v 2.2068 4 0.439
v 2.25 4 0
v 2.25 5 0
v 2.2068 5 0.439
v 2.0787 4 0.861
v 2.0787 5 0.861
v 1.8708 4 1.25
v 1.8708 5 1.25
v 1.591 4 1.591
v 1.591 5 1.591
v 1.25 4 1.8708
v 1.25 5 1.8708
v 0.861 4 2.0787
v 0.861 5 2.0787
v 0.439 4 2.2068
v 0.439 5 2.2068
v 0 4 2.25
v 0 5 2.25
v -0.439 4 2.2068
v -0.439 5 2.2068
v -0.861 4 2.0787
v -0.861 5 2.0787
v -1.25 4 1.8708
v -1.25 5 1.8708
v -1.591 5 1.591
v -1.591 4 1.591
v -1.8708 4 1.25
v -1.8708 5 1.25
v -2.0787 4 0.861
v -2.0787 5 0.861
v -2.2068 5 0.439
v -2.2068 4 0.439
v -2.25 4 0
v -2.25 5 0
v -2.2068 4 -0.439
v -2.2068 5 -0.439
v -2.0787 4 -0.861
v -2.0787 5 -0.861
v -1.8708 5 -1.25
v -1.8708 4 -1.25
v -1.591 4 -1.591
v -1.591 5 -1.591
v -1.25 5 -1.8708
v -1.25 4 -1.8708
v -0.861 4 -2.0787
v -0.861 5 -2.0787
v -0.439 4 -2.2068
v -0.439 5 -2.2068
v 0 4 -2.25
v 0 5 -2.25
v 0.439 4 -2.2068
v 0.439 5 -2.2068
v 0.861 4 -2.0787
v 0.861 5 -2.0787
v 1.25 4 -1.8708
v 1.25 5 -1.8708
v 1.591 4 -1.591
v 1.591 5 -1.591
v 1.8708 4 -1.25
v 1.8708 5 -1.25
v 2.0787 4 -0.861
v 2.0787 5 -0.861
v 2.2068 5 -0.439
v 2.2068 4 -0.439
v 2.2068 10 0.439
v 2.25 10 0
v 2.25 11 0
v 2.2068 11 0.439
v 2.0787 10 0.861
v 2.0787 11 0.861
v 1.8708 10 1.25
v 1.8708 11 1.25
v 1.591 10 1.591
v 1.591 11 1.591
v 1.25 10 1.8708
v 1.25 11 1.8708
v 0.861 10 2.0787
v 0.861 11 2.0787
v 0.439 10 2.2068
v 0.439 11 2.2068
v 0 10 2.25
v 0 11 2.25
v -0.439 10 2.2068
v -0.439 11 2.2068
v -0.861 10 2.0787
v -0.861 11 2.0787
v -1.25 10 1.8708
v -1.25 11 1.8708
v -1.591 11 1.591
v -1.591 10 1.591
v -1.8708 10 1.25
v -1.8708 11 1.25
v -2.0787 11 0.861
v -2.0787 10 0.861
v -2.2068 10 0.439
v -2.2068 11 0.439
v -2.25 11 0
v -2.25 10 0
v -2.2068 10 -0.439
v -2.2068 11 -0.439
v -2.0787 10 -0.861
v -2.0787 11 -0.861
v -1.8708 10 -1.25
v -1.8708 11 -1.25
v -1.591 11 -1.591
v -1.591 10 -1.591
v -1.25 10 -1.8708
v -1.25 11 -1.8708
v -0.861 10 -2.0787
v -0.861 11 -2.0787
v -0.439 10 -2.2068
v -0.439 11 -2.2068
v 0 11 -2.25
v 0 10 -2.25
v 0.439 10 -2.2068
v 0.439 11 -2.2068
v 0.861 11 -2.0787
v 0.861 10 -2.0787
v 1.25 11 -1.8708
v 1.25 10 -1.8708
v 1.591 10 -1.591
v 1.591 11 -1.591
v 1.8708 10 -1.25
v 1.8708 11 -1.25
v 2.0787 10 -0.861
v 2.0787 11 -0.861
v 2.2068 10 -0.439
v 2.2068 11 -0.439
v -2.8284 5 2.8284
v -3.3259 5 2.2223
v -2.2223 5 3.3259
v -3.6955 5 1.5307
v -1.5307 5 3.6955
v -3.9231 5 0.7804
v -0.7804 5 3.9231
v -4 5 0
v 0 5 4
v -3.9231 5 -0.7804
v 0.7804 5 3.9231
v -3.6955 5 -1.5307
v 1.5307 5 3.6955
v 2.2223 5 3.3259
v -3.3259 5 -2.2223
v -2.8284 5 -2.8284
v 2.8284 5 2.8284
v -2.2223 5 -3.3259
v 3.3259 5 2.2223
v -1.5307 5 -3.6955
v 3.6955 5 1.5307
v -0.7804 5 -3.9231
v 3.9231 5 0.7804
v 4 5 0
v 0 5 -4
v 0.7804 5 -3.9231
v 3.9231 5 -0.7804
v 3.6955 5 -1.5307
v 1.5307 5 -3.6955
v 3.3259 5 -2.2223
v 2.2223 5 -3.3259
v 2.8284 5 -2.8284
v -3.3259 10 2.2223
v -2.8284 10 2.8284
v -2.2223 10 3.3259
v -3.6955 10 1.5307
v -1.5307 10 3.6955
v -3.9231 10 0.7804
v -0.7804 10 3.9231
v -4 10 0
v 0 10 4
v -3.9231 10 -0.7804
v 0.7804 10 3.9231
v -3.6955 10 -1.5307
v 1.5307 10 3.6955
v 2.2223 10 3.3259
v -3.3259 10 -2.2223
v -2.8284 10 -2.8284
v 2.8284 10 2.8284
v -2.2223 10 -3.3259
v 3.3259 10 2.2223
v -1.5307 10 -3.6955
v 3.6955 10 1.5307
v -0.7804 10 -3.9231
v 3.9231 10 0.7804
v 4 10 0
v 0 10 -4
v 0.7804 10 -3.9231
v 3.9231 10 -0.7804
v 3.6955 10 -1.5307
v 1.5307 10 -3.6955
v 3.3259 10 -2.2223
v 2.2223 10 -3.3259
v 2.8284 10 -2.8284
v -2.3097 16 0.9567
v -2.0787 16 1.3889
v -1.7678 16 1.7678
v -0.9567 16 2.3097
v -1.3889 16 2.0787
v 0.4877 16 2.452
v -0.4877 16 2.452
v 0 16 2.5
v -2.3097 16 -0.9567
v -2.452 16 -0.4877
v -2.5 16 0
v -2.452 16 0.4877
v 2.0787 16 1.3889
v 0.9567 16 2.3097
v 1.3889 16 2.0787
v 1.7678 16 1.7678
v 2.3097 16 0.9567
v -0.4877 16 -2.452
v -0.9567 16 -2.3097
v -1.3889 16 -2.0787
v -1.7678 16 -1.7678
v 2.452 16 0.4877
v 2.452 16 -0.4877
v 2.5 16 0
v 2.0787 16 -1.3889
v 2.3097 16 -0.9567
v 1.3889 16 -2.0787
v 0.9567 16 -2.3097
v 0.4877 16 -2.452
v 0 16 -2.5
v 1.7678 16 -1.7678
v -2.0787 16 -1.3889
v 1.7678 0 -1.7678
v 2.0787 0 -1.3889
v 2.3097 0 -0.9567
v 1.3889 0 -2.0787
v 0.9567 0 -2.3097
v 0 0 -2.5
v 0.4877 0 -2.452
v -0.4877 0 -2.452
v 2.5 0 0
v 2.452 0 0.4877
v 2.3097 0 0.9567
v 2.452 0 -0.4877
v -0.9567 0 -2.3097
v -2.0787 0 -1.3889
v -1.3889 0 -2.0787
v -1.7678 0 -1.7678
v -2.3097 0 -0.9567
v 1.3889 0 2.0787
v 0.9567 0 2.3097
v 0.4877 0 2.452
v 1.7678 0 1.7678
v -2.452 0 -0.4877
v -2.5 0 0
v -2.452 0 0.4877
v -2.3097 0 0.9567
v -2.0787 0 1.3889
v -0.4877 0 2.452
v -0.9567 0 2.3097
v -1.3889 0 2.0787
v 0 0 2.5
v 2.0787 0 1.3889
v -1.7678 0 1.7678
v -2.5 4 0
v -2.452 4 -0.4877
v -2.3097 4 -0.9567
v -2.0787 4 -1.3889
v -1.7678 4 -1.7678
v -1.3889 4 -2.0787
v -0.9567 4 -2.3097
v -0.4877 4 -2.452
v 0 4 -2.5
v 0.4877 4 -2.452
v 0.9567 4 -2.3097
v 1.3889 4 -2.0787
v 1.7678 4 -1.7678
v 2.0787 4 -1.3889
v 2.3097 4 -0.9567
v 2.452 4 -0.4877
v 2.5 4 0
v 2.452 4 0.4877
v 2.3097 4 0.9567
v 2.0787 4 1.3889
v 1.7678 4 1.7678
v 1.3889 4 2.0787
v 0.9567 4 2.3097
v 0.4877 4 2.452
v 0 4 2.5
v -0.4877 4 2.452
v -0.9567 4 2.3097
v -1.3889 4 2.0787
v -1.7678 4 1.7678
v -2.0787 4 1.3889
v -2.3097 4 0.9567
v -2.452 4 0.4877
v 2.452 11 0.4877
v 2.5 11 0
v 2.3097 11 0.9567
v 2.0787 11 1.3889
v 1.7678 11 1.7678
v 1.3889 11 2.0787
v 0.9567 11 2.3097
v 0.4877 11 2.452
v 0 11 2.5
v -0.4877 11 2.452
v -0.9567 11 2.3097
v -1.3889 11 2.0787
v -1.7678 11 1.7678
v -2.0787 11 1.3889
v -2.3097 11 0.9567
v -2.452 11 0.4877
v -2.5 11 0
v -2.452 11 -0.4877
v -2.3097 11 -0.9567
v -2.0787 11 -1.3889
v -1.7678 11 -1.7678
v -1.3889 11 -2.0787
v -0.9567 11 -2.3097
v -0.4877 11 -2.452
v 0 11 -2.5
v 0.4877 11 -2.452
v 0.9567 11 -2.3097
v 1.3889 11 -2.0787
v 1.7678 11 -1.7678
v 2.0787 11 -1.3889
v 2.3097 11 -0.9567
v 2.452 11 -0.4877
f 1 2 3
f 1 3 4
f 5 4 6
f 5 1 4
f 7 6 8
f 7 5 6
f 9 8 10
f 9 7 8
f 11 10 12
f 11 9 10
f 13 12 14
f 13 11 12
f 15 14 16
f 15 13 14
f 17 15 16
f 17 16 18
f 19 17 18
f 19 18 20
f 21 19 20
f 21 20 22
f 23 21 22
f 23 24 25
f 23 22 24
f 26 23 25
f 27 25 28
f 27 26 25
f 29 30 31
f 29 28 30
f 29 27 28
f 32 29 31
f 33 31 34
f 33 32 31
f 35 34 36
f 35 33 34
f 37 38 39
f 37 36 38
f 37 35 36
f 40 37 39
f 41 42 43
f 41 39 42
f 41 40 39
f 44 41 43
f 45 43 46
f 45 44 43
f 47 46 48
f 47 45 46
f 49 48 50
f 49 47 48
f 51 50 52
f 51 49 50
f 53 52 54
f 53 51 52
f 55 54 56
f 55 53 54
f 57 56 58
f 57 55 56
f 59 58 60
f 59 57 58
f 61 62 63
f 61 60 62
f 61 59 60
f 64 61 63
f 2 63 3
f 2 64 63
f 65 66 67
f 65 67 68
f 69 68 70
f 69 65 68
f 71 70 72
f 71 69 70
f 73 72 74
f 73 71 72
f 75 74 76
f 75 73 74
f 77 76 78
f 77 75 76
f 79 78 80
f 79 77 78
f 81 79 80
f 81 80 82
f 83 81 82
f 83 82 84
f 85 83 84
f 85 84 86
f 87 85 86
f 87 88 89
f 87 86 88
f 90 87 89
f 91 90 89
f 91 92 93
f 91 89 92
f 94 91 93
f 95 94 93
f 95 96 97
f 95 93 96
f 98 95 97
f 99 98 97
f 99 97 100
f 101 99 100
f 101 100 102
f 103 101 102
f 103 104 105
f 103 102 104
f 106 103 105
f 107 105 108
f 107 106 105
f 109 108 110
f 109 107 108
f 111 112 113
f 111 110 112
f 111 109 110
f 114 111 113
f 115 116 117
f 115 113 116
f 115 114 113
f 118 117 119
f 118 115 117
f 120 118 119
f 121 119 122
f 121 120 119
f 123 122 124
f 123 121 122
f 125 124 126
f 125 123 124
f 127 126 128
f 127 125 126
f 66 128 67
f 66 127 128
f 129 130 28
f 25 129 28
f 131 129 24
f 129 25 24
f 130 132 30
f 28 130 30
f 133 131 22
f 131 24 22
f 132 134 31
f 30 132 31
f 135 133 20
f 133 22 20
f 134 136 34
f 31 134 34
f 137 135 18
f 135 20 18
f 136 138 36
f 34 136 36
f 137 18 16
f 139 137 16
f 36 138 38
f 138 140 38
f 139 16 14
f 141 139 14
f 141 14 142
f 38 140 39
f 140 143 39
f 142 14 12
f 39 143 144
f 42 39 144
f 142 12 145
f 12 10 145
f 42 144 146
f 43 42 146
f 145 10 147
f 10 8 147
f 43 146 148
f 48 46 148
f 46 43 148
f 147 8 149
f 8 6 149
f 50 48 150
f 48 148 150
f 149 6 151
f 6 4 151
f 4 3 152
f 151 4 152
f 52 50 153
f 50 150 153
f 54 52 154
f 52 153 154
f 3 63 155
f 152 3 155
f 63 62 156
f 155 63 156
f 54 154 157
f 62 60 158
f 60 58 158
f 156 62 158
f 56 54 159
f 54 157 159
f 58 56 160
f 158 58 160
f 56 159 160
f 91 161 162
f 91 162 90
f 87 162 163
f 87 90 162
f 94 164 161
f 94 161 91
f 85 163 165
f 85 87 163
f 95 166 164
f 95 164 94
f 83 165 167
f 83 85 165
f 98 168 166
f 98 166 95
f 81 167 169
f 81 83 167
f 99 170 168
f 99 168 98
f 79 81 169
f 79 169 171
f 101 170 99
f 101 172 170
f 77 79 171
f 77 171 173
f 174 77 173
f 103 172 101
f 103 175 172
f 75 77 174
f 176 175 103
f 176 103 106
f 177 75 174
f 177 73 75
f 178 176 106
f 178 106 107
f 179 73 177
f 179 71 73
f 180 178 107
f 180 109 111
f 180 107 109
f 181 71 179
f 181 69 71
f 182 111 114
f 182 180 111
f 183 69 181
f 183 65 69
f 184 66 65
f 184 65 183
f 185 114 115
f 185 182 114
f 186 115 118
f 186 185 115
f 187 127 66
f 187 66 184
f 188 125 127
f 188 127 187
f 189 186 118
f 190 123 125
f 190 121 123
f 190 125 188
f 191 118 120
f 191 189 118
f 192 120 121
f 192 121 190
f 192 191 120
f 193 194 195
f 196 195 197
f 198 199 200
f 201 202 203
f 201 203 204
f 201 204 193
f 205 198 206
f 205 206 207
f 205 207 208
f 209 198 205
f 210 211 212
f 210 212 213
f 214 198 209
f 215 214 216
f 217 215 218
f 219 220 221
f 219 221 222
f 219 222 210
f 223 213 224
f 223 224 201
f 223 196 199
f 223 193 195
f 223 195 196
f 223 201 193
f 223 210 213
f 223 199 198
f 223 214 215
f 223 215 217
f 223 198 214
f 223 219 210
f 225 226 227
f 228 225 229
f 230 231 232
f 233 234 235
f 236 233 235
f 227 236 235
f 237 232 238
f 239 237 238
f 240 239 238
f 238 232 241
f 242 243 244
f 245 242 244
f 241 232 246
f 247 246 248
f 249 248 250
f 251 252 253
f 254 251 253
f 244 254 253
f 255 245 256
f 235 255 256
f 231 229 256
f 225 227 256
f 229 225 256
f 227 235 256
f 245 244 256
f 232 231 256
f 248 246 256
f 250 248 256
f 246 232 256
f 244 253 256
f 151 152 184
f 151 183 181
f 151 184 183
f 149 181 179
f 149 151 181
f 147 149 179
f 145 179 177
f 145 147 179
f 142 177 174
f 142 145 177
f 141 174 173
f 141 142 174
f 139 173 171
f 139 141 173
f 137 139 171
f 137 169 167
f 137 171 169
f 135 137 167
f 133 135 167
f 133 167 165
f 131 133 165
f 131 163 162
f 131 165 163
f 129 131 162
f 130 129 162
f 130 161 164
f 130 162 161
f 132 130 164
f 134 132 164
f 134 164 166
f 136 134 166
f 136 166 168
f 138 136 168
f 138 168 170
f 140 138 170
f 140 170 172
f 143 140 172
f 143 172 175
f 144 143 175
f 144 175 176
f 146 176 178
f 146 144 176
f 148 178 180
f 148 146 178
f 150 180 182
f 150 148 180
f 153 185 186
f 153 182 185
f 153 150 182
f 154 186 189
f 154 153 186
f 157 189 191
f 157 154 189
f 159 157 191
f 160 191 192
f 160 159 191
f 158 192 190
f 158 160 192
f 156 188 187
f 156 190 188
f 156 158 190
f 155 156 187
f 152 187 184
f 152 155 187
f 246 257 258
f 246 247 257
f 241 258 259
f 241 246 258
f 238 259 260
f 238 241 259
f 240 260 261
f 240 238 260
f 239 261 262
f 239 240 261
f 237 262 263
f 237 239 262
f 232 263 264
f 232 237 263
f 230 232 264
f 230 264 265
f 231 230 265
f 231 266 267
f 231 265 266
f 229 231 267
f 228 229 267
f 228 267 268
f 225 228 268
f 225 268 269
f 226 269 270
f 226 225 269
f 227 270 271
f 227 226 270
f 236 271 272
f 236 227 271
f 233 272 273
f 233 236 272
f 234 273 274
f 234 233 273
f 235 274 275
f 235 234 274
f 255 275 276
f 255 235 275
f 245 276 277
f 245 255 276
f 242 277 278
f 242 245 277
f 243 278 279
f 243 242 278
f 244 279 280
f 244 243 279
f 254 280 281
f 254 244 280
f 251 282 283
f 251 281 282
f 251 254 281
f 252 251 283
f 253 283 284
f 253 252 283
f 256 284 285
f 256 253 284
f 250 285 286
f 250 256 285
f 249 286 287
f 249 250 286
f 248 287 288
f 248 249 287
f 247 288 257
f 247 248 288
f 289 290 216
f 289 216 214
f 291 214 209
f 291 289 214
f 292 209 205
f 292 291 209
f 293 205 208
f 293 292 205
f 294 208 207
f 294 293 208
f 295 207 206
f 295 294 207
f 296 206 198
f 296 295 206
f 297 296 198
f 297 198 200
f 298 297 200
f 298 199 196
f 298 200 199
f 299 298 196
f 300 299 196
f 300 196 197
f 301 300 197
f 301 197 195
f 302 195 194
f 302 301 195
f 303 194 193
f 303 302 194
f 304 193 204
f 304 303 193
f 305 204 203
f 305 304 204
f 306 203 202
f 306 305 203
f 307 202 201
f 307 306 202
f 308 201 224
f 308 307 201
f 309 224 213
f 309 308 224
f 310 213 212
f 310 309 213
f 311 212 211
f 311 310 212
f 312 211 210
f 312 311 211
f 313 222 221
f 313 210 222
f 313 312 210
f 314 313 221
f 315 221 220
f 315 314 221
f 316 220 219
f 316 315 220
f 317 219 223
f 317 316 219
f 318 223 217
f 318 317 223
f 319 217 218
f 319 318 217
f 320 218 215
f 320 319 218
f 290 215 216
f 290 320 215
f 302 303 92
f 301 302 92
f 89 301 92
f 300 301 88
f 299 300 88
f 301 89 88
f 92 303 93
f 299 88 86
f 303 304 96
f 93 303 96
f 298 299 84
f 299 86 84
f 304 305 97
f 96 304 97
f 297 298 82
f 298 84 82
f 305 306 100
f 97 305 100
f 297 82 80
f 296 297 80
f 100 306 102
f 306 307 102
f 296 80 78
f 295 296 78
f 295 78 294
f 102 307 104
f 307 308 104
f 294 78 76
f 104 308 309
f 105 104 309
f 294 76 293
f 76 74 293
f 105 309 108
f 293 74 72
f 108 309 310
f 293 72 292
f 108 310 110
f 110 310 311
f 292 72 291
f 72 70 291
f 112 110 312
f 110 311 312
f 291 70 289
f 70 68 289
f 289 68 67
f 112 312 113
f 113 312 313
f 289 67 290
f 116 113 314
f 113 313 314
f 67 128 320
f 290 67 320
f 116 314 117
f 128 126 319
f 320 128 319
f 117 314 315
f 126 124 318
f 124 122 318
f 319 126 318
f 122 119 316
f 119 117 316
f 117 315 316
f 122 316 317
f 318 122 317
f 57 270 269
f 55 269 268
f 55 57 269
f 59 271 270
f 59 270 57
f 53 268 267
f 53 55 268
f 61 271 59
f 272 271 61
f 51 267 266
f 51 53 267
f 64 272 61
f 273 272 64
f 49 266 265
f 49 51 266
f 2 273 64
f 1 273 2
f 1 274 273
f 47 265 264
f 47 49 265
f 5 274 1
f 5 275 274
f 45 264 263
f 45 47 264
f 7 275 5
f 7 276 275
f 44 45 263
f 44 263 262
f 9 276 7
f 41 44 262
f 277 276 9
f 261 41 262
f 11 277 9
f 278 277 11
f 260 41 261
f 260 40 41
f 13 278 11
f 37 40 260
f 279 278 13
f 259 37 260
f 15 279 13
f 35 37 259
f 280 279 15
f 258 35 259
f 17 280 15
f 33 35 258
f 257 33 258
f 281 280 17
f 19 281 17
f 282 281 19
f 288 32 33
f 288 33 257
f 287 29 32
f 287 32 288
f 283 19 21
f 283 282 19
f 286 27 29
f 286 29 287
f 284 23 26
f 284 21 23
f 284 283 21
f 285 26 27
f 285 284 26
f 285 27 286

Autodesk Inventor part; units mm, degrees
ref_plane "YZ Plane" through (0, 0, 0) normal (1, 0, 0) x (0, 1, 0)
ref_plane "XZ Plane" through (0, 0, 0) normal (0, 1, 0) x (-1, 0, 0)
ref_plane "XY Plane" through (0, 0, 0) normal (0, 0, 1) x (1, 0, 0)
sketch "Sketch1" plane through (0, 0, 0) normal (0, 1, 0) x (-1, 0, 0)
  circle A0 centre (0, 0) radius 2.5
  dimension "d0" = 5
extrude "Extrusion1" add sketch "Sketch1" along normal blind 4
sketch "Sketch2" plane through (0, 4, 0) normal (0, 1, 0) x (1, 0, 0)
  circle A0 centre (0, 0) radius 2.25
  dimension "d3" = 4.5
extrude "Extrusion2" add sketch "Sketch2" along normal blind 1
sketch "Sketch3" plane through (0, 5, 0) normal (0, 1, 0) x (1, 0, 0)
  circle A0 centre (0, 0) radius 4
  dimension "d6" = 8
extrude "Extrusion3" add sketch "Sketch3" along normal blind 5
sketch "Sketch4" plane through (0, 10, 0) normal (0, 1, 0) x (1, 0, 0)
  circle A0 centre (0, 0) radius 2.25
  dimension "d9" = 4.5
extrude "Extrusion4" add sketch "Sketch4" along normal blind 1
sketch "Sketch5" plane through (0, 11, 0) normal (0, 1, 0) x (1, 0, 0)
  circle A0 centre (0, 0) radius 2.5
  dimension "d18" = 5
extrude "Extrusion5" add sketch "Sketch5" along normal blind 5
thread "Thread1" size "M5x0.8" class "6g" standard "ANSI Metric M Profile" full length
thread "Thread2" size "M5x0.8" class "6g" standard "ANSI Metric M Profile" full length
properties part number "Cylinder Piping connector" material "Brass, Soft Yellow"
